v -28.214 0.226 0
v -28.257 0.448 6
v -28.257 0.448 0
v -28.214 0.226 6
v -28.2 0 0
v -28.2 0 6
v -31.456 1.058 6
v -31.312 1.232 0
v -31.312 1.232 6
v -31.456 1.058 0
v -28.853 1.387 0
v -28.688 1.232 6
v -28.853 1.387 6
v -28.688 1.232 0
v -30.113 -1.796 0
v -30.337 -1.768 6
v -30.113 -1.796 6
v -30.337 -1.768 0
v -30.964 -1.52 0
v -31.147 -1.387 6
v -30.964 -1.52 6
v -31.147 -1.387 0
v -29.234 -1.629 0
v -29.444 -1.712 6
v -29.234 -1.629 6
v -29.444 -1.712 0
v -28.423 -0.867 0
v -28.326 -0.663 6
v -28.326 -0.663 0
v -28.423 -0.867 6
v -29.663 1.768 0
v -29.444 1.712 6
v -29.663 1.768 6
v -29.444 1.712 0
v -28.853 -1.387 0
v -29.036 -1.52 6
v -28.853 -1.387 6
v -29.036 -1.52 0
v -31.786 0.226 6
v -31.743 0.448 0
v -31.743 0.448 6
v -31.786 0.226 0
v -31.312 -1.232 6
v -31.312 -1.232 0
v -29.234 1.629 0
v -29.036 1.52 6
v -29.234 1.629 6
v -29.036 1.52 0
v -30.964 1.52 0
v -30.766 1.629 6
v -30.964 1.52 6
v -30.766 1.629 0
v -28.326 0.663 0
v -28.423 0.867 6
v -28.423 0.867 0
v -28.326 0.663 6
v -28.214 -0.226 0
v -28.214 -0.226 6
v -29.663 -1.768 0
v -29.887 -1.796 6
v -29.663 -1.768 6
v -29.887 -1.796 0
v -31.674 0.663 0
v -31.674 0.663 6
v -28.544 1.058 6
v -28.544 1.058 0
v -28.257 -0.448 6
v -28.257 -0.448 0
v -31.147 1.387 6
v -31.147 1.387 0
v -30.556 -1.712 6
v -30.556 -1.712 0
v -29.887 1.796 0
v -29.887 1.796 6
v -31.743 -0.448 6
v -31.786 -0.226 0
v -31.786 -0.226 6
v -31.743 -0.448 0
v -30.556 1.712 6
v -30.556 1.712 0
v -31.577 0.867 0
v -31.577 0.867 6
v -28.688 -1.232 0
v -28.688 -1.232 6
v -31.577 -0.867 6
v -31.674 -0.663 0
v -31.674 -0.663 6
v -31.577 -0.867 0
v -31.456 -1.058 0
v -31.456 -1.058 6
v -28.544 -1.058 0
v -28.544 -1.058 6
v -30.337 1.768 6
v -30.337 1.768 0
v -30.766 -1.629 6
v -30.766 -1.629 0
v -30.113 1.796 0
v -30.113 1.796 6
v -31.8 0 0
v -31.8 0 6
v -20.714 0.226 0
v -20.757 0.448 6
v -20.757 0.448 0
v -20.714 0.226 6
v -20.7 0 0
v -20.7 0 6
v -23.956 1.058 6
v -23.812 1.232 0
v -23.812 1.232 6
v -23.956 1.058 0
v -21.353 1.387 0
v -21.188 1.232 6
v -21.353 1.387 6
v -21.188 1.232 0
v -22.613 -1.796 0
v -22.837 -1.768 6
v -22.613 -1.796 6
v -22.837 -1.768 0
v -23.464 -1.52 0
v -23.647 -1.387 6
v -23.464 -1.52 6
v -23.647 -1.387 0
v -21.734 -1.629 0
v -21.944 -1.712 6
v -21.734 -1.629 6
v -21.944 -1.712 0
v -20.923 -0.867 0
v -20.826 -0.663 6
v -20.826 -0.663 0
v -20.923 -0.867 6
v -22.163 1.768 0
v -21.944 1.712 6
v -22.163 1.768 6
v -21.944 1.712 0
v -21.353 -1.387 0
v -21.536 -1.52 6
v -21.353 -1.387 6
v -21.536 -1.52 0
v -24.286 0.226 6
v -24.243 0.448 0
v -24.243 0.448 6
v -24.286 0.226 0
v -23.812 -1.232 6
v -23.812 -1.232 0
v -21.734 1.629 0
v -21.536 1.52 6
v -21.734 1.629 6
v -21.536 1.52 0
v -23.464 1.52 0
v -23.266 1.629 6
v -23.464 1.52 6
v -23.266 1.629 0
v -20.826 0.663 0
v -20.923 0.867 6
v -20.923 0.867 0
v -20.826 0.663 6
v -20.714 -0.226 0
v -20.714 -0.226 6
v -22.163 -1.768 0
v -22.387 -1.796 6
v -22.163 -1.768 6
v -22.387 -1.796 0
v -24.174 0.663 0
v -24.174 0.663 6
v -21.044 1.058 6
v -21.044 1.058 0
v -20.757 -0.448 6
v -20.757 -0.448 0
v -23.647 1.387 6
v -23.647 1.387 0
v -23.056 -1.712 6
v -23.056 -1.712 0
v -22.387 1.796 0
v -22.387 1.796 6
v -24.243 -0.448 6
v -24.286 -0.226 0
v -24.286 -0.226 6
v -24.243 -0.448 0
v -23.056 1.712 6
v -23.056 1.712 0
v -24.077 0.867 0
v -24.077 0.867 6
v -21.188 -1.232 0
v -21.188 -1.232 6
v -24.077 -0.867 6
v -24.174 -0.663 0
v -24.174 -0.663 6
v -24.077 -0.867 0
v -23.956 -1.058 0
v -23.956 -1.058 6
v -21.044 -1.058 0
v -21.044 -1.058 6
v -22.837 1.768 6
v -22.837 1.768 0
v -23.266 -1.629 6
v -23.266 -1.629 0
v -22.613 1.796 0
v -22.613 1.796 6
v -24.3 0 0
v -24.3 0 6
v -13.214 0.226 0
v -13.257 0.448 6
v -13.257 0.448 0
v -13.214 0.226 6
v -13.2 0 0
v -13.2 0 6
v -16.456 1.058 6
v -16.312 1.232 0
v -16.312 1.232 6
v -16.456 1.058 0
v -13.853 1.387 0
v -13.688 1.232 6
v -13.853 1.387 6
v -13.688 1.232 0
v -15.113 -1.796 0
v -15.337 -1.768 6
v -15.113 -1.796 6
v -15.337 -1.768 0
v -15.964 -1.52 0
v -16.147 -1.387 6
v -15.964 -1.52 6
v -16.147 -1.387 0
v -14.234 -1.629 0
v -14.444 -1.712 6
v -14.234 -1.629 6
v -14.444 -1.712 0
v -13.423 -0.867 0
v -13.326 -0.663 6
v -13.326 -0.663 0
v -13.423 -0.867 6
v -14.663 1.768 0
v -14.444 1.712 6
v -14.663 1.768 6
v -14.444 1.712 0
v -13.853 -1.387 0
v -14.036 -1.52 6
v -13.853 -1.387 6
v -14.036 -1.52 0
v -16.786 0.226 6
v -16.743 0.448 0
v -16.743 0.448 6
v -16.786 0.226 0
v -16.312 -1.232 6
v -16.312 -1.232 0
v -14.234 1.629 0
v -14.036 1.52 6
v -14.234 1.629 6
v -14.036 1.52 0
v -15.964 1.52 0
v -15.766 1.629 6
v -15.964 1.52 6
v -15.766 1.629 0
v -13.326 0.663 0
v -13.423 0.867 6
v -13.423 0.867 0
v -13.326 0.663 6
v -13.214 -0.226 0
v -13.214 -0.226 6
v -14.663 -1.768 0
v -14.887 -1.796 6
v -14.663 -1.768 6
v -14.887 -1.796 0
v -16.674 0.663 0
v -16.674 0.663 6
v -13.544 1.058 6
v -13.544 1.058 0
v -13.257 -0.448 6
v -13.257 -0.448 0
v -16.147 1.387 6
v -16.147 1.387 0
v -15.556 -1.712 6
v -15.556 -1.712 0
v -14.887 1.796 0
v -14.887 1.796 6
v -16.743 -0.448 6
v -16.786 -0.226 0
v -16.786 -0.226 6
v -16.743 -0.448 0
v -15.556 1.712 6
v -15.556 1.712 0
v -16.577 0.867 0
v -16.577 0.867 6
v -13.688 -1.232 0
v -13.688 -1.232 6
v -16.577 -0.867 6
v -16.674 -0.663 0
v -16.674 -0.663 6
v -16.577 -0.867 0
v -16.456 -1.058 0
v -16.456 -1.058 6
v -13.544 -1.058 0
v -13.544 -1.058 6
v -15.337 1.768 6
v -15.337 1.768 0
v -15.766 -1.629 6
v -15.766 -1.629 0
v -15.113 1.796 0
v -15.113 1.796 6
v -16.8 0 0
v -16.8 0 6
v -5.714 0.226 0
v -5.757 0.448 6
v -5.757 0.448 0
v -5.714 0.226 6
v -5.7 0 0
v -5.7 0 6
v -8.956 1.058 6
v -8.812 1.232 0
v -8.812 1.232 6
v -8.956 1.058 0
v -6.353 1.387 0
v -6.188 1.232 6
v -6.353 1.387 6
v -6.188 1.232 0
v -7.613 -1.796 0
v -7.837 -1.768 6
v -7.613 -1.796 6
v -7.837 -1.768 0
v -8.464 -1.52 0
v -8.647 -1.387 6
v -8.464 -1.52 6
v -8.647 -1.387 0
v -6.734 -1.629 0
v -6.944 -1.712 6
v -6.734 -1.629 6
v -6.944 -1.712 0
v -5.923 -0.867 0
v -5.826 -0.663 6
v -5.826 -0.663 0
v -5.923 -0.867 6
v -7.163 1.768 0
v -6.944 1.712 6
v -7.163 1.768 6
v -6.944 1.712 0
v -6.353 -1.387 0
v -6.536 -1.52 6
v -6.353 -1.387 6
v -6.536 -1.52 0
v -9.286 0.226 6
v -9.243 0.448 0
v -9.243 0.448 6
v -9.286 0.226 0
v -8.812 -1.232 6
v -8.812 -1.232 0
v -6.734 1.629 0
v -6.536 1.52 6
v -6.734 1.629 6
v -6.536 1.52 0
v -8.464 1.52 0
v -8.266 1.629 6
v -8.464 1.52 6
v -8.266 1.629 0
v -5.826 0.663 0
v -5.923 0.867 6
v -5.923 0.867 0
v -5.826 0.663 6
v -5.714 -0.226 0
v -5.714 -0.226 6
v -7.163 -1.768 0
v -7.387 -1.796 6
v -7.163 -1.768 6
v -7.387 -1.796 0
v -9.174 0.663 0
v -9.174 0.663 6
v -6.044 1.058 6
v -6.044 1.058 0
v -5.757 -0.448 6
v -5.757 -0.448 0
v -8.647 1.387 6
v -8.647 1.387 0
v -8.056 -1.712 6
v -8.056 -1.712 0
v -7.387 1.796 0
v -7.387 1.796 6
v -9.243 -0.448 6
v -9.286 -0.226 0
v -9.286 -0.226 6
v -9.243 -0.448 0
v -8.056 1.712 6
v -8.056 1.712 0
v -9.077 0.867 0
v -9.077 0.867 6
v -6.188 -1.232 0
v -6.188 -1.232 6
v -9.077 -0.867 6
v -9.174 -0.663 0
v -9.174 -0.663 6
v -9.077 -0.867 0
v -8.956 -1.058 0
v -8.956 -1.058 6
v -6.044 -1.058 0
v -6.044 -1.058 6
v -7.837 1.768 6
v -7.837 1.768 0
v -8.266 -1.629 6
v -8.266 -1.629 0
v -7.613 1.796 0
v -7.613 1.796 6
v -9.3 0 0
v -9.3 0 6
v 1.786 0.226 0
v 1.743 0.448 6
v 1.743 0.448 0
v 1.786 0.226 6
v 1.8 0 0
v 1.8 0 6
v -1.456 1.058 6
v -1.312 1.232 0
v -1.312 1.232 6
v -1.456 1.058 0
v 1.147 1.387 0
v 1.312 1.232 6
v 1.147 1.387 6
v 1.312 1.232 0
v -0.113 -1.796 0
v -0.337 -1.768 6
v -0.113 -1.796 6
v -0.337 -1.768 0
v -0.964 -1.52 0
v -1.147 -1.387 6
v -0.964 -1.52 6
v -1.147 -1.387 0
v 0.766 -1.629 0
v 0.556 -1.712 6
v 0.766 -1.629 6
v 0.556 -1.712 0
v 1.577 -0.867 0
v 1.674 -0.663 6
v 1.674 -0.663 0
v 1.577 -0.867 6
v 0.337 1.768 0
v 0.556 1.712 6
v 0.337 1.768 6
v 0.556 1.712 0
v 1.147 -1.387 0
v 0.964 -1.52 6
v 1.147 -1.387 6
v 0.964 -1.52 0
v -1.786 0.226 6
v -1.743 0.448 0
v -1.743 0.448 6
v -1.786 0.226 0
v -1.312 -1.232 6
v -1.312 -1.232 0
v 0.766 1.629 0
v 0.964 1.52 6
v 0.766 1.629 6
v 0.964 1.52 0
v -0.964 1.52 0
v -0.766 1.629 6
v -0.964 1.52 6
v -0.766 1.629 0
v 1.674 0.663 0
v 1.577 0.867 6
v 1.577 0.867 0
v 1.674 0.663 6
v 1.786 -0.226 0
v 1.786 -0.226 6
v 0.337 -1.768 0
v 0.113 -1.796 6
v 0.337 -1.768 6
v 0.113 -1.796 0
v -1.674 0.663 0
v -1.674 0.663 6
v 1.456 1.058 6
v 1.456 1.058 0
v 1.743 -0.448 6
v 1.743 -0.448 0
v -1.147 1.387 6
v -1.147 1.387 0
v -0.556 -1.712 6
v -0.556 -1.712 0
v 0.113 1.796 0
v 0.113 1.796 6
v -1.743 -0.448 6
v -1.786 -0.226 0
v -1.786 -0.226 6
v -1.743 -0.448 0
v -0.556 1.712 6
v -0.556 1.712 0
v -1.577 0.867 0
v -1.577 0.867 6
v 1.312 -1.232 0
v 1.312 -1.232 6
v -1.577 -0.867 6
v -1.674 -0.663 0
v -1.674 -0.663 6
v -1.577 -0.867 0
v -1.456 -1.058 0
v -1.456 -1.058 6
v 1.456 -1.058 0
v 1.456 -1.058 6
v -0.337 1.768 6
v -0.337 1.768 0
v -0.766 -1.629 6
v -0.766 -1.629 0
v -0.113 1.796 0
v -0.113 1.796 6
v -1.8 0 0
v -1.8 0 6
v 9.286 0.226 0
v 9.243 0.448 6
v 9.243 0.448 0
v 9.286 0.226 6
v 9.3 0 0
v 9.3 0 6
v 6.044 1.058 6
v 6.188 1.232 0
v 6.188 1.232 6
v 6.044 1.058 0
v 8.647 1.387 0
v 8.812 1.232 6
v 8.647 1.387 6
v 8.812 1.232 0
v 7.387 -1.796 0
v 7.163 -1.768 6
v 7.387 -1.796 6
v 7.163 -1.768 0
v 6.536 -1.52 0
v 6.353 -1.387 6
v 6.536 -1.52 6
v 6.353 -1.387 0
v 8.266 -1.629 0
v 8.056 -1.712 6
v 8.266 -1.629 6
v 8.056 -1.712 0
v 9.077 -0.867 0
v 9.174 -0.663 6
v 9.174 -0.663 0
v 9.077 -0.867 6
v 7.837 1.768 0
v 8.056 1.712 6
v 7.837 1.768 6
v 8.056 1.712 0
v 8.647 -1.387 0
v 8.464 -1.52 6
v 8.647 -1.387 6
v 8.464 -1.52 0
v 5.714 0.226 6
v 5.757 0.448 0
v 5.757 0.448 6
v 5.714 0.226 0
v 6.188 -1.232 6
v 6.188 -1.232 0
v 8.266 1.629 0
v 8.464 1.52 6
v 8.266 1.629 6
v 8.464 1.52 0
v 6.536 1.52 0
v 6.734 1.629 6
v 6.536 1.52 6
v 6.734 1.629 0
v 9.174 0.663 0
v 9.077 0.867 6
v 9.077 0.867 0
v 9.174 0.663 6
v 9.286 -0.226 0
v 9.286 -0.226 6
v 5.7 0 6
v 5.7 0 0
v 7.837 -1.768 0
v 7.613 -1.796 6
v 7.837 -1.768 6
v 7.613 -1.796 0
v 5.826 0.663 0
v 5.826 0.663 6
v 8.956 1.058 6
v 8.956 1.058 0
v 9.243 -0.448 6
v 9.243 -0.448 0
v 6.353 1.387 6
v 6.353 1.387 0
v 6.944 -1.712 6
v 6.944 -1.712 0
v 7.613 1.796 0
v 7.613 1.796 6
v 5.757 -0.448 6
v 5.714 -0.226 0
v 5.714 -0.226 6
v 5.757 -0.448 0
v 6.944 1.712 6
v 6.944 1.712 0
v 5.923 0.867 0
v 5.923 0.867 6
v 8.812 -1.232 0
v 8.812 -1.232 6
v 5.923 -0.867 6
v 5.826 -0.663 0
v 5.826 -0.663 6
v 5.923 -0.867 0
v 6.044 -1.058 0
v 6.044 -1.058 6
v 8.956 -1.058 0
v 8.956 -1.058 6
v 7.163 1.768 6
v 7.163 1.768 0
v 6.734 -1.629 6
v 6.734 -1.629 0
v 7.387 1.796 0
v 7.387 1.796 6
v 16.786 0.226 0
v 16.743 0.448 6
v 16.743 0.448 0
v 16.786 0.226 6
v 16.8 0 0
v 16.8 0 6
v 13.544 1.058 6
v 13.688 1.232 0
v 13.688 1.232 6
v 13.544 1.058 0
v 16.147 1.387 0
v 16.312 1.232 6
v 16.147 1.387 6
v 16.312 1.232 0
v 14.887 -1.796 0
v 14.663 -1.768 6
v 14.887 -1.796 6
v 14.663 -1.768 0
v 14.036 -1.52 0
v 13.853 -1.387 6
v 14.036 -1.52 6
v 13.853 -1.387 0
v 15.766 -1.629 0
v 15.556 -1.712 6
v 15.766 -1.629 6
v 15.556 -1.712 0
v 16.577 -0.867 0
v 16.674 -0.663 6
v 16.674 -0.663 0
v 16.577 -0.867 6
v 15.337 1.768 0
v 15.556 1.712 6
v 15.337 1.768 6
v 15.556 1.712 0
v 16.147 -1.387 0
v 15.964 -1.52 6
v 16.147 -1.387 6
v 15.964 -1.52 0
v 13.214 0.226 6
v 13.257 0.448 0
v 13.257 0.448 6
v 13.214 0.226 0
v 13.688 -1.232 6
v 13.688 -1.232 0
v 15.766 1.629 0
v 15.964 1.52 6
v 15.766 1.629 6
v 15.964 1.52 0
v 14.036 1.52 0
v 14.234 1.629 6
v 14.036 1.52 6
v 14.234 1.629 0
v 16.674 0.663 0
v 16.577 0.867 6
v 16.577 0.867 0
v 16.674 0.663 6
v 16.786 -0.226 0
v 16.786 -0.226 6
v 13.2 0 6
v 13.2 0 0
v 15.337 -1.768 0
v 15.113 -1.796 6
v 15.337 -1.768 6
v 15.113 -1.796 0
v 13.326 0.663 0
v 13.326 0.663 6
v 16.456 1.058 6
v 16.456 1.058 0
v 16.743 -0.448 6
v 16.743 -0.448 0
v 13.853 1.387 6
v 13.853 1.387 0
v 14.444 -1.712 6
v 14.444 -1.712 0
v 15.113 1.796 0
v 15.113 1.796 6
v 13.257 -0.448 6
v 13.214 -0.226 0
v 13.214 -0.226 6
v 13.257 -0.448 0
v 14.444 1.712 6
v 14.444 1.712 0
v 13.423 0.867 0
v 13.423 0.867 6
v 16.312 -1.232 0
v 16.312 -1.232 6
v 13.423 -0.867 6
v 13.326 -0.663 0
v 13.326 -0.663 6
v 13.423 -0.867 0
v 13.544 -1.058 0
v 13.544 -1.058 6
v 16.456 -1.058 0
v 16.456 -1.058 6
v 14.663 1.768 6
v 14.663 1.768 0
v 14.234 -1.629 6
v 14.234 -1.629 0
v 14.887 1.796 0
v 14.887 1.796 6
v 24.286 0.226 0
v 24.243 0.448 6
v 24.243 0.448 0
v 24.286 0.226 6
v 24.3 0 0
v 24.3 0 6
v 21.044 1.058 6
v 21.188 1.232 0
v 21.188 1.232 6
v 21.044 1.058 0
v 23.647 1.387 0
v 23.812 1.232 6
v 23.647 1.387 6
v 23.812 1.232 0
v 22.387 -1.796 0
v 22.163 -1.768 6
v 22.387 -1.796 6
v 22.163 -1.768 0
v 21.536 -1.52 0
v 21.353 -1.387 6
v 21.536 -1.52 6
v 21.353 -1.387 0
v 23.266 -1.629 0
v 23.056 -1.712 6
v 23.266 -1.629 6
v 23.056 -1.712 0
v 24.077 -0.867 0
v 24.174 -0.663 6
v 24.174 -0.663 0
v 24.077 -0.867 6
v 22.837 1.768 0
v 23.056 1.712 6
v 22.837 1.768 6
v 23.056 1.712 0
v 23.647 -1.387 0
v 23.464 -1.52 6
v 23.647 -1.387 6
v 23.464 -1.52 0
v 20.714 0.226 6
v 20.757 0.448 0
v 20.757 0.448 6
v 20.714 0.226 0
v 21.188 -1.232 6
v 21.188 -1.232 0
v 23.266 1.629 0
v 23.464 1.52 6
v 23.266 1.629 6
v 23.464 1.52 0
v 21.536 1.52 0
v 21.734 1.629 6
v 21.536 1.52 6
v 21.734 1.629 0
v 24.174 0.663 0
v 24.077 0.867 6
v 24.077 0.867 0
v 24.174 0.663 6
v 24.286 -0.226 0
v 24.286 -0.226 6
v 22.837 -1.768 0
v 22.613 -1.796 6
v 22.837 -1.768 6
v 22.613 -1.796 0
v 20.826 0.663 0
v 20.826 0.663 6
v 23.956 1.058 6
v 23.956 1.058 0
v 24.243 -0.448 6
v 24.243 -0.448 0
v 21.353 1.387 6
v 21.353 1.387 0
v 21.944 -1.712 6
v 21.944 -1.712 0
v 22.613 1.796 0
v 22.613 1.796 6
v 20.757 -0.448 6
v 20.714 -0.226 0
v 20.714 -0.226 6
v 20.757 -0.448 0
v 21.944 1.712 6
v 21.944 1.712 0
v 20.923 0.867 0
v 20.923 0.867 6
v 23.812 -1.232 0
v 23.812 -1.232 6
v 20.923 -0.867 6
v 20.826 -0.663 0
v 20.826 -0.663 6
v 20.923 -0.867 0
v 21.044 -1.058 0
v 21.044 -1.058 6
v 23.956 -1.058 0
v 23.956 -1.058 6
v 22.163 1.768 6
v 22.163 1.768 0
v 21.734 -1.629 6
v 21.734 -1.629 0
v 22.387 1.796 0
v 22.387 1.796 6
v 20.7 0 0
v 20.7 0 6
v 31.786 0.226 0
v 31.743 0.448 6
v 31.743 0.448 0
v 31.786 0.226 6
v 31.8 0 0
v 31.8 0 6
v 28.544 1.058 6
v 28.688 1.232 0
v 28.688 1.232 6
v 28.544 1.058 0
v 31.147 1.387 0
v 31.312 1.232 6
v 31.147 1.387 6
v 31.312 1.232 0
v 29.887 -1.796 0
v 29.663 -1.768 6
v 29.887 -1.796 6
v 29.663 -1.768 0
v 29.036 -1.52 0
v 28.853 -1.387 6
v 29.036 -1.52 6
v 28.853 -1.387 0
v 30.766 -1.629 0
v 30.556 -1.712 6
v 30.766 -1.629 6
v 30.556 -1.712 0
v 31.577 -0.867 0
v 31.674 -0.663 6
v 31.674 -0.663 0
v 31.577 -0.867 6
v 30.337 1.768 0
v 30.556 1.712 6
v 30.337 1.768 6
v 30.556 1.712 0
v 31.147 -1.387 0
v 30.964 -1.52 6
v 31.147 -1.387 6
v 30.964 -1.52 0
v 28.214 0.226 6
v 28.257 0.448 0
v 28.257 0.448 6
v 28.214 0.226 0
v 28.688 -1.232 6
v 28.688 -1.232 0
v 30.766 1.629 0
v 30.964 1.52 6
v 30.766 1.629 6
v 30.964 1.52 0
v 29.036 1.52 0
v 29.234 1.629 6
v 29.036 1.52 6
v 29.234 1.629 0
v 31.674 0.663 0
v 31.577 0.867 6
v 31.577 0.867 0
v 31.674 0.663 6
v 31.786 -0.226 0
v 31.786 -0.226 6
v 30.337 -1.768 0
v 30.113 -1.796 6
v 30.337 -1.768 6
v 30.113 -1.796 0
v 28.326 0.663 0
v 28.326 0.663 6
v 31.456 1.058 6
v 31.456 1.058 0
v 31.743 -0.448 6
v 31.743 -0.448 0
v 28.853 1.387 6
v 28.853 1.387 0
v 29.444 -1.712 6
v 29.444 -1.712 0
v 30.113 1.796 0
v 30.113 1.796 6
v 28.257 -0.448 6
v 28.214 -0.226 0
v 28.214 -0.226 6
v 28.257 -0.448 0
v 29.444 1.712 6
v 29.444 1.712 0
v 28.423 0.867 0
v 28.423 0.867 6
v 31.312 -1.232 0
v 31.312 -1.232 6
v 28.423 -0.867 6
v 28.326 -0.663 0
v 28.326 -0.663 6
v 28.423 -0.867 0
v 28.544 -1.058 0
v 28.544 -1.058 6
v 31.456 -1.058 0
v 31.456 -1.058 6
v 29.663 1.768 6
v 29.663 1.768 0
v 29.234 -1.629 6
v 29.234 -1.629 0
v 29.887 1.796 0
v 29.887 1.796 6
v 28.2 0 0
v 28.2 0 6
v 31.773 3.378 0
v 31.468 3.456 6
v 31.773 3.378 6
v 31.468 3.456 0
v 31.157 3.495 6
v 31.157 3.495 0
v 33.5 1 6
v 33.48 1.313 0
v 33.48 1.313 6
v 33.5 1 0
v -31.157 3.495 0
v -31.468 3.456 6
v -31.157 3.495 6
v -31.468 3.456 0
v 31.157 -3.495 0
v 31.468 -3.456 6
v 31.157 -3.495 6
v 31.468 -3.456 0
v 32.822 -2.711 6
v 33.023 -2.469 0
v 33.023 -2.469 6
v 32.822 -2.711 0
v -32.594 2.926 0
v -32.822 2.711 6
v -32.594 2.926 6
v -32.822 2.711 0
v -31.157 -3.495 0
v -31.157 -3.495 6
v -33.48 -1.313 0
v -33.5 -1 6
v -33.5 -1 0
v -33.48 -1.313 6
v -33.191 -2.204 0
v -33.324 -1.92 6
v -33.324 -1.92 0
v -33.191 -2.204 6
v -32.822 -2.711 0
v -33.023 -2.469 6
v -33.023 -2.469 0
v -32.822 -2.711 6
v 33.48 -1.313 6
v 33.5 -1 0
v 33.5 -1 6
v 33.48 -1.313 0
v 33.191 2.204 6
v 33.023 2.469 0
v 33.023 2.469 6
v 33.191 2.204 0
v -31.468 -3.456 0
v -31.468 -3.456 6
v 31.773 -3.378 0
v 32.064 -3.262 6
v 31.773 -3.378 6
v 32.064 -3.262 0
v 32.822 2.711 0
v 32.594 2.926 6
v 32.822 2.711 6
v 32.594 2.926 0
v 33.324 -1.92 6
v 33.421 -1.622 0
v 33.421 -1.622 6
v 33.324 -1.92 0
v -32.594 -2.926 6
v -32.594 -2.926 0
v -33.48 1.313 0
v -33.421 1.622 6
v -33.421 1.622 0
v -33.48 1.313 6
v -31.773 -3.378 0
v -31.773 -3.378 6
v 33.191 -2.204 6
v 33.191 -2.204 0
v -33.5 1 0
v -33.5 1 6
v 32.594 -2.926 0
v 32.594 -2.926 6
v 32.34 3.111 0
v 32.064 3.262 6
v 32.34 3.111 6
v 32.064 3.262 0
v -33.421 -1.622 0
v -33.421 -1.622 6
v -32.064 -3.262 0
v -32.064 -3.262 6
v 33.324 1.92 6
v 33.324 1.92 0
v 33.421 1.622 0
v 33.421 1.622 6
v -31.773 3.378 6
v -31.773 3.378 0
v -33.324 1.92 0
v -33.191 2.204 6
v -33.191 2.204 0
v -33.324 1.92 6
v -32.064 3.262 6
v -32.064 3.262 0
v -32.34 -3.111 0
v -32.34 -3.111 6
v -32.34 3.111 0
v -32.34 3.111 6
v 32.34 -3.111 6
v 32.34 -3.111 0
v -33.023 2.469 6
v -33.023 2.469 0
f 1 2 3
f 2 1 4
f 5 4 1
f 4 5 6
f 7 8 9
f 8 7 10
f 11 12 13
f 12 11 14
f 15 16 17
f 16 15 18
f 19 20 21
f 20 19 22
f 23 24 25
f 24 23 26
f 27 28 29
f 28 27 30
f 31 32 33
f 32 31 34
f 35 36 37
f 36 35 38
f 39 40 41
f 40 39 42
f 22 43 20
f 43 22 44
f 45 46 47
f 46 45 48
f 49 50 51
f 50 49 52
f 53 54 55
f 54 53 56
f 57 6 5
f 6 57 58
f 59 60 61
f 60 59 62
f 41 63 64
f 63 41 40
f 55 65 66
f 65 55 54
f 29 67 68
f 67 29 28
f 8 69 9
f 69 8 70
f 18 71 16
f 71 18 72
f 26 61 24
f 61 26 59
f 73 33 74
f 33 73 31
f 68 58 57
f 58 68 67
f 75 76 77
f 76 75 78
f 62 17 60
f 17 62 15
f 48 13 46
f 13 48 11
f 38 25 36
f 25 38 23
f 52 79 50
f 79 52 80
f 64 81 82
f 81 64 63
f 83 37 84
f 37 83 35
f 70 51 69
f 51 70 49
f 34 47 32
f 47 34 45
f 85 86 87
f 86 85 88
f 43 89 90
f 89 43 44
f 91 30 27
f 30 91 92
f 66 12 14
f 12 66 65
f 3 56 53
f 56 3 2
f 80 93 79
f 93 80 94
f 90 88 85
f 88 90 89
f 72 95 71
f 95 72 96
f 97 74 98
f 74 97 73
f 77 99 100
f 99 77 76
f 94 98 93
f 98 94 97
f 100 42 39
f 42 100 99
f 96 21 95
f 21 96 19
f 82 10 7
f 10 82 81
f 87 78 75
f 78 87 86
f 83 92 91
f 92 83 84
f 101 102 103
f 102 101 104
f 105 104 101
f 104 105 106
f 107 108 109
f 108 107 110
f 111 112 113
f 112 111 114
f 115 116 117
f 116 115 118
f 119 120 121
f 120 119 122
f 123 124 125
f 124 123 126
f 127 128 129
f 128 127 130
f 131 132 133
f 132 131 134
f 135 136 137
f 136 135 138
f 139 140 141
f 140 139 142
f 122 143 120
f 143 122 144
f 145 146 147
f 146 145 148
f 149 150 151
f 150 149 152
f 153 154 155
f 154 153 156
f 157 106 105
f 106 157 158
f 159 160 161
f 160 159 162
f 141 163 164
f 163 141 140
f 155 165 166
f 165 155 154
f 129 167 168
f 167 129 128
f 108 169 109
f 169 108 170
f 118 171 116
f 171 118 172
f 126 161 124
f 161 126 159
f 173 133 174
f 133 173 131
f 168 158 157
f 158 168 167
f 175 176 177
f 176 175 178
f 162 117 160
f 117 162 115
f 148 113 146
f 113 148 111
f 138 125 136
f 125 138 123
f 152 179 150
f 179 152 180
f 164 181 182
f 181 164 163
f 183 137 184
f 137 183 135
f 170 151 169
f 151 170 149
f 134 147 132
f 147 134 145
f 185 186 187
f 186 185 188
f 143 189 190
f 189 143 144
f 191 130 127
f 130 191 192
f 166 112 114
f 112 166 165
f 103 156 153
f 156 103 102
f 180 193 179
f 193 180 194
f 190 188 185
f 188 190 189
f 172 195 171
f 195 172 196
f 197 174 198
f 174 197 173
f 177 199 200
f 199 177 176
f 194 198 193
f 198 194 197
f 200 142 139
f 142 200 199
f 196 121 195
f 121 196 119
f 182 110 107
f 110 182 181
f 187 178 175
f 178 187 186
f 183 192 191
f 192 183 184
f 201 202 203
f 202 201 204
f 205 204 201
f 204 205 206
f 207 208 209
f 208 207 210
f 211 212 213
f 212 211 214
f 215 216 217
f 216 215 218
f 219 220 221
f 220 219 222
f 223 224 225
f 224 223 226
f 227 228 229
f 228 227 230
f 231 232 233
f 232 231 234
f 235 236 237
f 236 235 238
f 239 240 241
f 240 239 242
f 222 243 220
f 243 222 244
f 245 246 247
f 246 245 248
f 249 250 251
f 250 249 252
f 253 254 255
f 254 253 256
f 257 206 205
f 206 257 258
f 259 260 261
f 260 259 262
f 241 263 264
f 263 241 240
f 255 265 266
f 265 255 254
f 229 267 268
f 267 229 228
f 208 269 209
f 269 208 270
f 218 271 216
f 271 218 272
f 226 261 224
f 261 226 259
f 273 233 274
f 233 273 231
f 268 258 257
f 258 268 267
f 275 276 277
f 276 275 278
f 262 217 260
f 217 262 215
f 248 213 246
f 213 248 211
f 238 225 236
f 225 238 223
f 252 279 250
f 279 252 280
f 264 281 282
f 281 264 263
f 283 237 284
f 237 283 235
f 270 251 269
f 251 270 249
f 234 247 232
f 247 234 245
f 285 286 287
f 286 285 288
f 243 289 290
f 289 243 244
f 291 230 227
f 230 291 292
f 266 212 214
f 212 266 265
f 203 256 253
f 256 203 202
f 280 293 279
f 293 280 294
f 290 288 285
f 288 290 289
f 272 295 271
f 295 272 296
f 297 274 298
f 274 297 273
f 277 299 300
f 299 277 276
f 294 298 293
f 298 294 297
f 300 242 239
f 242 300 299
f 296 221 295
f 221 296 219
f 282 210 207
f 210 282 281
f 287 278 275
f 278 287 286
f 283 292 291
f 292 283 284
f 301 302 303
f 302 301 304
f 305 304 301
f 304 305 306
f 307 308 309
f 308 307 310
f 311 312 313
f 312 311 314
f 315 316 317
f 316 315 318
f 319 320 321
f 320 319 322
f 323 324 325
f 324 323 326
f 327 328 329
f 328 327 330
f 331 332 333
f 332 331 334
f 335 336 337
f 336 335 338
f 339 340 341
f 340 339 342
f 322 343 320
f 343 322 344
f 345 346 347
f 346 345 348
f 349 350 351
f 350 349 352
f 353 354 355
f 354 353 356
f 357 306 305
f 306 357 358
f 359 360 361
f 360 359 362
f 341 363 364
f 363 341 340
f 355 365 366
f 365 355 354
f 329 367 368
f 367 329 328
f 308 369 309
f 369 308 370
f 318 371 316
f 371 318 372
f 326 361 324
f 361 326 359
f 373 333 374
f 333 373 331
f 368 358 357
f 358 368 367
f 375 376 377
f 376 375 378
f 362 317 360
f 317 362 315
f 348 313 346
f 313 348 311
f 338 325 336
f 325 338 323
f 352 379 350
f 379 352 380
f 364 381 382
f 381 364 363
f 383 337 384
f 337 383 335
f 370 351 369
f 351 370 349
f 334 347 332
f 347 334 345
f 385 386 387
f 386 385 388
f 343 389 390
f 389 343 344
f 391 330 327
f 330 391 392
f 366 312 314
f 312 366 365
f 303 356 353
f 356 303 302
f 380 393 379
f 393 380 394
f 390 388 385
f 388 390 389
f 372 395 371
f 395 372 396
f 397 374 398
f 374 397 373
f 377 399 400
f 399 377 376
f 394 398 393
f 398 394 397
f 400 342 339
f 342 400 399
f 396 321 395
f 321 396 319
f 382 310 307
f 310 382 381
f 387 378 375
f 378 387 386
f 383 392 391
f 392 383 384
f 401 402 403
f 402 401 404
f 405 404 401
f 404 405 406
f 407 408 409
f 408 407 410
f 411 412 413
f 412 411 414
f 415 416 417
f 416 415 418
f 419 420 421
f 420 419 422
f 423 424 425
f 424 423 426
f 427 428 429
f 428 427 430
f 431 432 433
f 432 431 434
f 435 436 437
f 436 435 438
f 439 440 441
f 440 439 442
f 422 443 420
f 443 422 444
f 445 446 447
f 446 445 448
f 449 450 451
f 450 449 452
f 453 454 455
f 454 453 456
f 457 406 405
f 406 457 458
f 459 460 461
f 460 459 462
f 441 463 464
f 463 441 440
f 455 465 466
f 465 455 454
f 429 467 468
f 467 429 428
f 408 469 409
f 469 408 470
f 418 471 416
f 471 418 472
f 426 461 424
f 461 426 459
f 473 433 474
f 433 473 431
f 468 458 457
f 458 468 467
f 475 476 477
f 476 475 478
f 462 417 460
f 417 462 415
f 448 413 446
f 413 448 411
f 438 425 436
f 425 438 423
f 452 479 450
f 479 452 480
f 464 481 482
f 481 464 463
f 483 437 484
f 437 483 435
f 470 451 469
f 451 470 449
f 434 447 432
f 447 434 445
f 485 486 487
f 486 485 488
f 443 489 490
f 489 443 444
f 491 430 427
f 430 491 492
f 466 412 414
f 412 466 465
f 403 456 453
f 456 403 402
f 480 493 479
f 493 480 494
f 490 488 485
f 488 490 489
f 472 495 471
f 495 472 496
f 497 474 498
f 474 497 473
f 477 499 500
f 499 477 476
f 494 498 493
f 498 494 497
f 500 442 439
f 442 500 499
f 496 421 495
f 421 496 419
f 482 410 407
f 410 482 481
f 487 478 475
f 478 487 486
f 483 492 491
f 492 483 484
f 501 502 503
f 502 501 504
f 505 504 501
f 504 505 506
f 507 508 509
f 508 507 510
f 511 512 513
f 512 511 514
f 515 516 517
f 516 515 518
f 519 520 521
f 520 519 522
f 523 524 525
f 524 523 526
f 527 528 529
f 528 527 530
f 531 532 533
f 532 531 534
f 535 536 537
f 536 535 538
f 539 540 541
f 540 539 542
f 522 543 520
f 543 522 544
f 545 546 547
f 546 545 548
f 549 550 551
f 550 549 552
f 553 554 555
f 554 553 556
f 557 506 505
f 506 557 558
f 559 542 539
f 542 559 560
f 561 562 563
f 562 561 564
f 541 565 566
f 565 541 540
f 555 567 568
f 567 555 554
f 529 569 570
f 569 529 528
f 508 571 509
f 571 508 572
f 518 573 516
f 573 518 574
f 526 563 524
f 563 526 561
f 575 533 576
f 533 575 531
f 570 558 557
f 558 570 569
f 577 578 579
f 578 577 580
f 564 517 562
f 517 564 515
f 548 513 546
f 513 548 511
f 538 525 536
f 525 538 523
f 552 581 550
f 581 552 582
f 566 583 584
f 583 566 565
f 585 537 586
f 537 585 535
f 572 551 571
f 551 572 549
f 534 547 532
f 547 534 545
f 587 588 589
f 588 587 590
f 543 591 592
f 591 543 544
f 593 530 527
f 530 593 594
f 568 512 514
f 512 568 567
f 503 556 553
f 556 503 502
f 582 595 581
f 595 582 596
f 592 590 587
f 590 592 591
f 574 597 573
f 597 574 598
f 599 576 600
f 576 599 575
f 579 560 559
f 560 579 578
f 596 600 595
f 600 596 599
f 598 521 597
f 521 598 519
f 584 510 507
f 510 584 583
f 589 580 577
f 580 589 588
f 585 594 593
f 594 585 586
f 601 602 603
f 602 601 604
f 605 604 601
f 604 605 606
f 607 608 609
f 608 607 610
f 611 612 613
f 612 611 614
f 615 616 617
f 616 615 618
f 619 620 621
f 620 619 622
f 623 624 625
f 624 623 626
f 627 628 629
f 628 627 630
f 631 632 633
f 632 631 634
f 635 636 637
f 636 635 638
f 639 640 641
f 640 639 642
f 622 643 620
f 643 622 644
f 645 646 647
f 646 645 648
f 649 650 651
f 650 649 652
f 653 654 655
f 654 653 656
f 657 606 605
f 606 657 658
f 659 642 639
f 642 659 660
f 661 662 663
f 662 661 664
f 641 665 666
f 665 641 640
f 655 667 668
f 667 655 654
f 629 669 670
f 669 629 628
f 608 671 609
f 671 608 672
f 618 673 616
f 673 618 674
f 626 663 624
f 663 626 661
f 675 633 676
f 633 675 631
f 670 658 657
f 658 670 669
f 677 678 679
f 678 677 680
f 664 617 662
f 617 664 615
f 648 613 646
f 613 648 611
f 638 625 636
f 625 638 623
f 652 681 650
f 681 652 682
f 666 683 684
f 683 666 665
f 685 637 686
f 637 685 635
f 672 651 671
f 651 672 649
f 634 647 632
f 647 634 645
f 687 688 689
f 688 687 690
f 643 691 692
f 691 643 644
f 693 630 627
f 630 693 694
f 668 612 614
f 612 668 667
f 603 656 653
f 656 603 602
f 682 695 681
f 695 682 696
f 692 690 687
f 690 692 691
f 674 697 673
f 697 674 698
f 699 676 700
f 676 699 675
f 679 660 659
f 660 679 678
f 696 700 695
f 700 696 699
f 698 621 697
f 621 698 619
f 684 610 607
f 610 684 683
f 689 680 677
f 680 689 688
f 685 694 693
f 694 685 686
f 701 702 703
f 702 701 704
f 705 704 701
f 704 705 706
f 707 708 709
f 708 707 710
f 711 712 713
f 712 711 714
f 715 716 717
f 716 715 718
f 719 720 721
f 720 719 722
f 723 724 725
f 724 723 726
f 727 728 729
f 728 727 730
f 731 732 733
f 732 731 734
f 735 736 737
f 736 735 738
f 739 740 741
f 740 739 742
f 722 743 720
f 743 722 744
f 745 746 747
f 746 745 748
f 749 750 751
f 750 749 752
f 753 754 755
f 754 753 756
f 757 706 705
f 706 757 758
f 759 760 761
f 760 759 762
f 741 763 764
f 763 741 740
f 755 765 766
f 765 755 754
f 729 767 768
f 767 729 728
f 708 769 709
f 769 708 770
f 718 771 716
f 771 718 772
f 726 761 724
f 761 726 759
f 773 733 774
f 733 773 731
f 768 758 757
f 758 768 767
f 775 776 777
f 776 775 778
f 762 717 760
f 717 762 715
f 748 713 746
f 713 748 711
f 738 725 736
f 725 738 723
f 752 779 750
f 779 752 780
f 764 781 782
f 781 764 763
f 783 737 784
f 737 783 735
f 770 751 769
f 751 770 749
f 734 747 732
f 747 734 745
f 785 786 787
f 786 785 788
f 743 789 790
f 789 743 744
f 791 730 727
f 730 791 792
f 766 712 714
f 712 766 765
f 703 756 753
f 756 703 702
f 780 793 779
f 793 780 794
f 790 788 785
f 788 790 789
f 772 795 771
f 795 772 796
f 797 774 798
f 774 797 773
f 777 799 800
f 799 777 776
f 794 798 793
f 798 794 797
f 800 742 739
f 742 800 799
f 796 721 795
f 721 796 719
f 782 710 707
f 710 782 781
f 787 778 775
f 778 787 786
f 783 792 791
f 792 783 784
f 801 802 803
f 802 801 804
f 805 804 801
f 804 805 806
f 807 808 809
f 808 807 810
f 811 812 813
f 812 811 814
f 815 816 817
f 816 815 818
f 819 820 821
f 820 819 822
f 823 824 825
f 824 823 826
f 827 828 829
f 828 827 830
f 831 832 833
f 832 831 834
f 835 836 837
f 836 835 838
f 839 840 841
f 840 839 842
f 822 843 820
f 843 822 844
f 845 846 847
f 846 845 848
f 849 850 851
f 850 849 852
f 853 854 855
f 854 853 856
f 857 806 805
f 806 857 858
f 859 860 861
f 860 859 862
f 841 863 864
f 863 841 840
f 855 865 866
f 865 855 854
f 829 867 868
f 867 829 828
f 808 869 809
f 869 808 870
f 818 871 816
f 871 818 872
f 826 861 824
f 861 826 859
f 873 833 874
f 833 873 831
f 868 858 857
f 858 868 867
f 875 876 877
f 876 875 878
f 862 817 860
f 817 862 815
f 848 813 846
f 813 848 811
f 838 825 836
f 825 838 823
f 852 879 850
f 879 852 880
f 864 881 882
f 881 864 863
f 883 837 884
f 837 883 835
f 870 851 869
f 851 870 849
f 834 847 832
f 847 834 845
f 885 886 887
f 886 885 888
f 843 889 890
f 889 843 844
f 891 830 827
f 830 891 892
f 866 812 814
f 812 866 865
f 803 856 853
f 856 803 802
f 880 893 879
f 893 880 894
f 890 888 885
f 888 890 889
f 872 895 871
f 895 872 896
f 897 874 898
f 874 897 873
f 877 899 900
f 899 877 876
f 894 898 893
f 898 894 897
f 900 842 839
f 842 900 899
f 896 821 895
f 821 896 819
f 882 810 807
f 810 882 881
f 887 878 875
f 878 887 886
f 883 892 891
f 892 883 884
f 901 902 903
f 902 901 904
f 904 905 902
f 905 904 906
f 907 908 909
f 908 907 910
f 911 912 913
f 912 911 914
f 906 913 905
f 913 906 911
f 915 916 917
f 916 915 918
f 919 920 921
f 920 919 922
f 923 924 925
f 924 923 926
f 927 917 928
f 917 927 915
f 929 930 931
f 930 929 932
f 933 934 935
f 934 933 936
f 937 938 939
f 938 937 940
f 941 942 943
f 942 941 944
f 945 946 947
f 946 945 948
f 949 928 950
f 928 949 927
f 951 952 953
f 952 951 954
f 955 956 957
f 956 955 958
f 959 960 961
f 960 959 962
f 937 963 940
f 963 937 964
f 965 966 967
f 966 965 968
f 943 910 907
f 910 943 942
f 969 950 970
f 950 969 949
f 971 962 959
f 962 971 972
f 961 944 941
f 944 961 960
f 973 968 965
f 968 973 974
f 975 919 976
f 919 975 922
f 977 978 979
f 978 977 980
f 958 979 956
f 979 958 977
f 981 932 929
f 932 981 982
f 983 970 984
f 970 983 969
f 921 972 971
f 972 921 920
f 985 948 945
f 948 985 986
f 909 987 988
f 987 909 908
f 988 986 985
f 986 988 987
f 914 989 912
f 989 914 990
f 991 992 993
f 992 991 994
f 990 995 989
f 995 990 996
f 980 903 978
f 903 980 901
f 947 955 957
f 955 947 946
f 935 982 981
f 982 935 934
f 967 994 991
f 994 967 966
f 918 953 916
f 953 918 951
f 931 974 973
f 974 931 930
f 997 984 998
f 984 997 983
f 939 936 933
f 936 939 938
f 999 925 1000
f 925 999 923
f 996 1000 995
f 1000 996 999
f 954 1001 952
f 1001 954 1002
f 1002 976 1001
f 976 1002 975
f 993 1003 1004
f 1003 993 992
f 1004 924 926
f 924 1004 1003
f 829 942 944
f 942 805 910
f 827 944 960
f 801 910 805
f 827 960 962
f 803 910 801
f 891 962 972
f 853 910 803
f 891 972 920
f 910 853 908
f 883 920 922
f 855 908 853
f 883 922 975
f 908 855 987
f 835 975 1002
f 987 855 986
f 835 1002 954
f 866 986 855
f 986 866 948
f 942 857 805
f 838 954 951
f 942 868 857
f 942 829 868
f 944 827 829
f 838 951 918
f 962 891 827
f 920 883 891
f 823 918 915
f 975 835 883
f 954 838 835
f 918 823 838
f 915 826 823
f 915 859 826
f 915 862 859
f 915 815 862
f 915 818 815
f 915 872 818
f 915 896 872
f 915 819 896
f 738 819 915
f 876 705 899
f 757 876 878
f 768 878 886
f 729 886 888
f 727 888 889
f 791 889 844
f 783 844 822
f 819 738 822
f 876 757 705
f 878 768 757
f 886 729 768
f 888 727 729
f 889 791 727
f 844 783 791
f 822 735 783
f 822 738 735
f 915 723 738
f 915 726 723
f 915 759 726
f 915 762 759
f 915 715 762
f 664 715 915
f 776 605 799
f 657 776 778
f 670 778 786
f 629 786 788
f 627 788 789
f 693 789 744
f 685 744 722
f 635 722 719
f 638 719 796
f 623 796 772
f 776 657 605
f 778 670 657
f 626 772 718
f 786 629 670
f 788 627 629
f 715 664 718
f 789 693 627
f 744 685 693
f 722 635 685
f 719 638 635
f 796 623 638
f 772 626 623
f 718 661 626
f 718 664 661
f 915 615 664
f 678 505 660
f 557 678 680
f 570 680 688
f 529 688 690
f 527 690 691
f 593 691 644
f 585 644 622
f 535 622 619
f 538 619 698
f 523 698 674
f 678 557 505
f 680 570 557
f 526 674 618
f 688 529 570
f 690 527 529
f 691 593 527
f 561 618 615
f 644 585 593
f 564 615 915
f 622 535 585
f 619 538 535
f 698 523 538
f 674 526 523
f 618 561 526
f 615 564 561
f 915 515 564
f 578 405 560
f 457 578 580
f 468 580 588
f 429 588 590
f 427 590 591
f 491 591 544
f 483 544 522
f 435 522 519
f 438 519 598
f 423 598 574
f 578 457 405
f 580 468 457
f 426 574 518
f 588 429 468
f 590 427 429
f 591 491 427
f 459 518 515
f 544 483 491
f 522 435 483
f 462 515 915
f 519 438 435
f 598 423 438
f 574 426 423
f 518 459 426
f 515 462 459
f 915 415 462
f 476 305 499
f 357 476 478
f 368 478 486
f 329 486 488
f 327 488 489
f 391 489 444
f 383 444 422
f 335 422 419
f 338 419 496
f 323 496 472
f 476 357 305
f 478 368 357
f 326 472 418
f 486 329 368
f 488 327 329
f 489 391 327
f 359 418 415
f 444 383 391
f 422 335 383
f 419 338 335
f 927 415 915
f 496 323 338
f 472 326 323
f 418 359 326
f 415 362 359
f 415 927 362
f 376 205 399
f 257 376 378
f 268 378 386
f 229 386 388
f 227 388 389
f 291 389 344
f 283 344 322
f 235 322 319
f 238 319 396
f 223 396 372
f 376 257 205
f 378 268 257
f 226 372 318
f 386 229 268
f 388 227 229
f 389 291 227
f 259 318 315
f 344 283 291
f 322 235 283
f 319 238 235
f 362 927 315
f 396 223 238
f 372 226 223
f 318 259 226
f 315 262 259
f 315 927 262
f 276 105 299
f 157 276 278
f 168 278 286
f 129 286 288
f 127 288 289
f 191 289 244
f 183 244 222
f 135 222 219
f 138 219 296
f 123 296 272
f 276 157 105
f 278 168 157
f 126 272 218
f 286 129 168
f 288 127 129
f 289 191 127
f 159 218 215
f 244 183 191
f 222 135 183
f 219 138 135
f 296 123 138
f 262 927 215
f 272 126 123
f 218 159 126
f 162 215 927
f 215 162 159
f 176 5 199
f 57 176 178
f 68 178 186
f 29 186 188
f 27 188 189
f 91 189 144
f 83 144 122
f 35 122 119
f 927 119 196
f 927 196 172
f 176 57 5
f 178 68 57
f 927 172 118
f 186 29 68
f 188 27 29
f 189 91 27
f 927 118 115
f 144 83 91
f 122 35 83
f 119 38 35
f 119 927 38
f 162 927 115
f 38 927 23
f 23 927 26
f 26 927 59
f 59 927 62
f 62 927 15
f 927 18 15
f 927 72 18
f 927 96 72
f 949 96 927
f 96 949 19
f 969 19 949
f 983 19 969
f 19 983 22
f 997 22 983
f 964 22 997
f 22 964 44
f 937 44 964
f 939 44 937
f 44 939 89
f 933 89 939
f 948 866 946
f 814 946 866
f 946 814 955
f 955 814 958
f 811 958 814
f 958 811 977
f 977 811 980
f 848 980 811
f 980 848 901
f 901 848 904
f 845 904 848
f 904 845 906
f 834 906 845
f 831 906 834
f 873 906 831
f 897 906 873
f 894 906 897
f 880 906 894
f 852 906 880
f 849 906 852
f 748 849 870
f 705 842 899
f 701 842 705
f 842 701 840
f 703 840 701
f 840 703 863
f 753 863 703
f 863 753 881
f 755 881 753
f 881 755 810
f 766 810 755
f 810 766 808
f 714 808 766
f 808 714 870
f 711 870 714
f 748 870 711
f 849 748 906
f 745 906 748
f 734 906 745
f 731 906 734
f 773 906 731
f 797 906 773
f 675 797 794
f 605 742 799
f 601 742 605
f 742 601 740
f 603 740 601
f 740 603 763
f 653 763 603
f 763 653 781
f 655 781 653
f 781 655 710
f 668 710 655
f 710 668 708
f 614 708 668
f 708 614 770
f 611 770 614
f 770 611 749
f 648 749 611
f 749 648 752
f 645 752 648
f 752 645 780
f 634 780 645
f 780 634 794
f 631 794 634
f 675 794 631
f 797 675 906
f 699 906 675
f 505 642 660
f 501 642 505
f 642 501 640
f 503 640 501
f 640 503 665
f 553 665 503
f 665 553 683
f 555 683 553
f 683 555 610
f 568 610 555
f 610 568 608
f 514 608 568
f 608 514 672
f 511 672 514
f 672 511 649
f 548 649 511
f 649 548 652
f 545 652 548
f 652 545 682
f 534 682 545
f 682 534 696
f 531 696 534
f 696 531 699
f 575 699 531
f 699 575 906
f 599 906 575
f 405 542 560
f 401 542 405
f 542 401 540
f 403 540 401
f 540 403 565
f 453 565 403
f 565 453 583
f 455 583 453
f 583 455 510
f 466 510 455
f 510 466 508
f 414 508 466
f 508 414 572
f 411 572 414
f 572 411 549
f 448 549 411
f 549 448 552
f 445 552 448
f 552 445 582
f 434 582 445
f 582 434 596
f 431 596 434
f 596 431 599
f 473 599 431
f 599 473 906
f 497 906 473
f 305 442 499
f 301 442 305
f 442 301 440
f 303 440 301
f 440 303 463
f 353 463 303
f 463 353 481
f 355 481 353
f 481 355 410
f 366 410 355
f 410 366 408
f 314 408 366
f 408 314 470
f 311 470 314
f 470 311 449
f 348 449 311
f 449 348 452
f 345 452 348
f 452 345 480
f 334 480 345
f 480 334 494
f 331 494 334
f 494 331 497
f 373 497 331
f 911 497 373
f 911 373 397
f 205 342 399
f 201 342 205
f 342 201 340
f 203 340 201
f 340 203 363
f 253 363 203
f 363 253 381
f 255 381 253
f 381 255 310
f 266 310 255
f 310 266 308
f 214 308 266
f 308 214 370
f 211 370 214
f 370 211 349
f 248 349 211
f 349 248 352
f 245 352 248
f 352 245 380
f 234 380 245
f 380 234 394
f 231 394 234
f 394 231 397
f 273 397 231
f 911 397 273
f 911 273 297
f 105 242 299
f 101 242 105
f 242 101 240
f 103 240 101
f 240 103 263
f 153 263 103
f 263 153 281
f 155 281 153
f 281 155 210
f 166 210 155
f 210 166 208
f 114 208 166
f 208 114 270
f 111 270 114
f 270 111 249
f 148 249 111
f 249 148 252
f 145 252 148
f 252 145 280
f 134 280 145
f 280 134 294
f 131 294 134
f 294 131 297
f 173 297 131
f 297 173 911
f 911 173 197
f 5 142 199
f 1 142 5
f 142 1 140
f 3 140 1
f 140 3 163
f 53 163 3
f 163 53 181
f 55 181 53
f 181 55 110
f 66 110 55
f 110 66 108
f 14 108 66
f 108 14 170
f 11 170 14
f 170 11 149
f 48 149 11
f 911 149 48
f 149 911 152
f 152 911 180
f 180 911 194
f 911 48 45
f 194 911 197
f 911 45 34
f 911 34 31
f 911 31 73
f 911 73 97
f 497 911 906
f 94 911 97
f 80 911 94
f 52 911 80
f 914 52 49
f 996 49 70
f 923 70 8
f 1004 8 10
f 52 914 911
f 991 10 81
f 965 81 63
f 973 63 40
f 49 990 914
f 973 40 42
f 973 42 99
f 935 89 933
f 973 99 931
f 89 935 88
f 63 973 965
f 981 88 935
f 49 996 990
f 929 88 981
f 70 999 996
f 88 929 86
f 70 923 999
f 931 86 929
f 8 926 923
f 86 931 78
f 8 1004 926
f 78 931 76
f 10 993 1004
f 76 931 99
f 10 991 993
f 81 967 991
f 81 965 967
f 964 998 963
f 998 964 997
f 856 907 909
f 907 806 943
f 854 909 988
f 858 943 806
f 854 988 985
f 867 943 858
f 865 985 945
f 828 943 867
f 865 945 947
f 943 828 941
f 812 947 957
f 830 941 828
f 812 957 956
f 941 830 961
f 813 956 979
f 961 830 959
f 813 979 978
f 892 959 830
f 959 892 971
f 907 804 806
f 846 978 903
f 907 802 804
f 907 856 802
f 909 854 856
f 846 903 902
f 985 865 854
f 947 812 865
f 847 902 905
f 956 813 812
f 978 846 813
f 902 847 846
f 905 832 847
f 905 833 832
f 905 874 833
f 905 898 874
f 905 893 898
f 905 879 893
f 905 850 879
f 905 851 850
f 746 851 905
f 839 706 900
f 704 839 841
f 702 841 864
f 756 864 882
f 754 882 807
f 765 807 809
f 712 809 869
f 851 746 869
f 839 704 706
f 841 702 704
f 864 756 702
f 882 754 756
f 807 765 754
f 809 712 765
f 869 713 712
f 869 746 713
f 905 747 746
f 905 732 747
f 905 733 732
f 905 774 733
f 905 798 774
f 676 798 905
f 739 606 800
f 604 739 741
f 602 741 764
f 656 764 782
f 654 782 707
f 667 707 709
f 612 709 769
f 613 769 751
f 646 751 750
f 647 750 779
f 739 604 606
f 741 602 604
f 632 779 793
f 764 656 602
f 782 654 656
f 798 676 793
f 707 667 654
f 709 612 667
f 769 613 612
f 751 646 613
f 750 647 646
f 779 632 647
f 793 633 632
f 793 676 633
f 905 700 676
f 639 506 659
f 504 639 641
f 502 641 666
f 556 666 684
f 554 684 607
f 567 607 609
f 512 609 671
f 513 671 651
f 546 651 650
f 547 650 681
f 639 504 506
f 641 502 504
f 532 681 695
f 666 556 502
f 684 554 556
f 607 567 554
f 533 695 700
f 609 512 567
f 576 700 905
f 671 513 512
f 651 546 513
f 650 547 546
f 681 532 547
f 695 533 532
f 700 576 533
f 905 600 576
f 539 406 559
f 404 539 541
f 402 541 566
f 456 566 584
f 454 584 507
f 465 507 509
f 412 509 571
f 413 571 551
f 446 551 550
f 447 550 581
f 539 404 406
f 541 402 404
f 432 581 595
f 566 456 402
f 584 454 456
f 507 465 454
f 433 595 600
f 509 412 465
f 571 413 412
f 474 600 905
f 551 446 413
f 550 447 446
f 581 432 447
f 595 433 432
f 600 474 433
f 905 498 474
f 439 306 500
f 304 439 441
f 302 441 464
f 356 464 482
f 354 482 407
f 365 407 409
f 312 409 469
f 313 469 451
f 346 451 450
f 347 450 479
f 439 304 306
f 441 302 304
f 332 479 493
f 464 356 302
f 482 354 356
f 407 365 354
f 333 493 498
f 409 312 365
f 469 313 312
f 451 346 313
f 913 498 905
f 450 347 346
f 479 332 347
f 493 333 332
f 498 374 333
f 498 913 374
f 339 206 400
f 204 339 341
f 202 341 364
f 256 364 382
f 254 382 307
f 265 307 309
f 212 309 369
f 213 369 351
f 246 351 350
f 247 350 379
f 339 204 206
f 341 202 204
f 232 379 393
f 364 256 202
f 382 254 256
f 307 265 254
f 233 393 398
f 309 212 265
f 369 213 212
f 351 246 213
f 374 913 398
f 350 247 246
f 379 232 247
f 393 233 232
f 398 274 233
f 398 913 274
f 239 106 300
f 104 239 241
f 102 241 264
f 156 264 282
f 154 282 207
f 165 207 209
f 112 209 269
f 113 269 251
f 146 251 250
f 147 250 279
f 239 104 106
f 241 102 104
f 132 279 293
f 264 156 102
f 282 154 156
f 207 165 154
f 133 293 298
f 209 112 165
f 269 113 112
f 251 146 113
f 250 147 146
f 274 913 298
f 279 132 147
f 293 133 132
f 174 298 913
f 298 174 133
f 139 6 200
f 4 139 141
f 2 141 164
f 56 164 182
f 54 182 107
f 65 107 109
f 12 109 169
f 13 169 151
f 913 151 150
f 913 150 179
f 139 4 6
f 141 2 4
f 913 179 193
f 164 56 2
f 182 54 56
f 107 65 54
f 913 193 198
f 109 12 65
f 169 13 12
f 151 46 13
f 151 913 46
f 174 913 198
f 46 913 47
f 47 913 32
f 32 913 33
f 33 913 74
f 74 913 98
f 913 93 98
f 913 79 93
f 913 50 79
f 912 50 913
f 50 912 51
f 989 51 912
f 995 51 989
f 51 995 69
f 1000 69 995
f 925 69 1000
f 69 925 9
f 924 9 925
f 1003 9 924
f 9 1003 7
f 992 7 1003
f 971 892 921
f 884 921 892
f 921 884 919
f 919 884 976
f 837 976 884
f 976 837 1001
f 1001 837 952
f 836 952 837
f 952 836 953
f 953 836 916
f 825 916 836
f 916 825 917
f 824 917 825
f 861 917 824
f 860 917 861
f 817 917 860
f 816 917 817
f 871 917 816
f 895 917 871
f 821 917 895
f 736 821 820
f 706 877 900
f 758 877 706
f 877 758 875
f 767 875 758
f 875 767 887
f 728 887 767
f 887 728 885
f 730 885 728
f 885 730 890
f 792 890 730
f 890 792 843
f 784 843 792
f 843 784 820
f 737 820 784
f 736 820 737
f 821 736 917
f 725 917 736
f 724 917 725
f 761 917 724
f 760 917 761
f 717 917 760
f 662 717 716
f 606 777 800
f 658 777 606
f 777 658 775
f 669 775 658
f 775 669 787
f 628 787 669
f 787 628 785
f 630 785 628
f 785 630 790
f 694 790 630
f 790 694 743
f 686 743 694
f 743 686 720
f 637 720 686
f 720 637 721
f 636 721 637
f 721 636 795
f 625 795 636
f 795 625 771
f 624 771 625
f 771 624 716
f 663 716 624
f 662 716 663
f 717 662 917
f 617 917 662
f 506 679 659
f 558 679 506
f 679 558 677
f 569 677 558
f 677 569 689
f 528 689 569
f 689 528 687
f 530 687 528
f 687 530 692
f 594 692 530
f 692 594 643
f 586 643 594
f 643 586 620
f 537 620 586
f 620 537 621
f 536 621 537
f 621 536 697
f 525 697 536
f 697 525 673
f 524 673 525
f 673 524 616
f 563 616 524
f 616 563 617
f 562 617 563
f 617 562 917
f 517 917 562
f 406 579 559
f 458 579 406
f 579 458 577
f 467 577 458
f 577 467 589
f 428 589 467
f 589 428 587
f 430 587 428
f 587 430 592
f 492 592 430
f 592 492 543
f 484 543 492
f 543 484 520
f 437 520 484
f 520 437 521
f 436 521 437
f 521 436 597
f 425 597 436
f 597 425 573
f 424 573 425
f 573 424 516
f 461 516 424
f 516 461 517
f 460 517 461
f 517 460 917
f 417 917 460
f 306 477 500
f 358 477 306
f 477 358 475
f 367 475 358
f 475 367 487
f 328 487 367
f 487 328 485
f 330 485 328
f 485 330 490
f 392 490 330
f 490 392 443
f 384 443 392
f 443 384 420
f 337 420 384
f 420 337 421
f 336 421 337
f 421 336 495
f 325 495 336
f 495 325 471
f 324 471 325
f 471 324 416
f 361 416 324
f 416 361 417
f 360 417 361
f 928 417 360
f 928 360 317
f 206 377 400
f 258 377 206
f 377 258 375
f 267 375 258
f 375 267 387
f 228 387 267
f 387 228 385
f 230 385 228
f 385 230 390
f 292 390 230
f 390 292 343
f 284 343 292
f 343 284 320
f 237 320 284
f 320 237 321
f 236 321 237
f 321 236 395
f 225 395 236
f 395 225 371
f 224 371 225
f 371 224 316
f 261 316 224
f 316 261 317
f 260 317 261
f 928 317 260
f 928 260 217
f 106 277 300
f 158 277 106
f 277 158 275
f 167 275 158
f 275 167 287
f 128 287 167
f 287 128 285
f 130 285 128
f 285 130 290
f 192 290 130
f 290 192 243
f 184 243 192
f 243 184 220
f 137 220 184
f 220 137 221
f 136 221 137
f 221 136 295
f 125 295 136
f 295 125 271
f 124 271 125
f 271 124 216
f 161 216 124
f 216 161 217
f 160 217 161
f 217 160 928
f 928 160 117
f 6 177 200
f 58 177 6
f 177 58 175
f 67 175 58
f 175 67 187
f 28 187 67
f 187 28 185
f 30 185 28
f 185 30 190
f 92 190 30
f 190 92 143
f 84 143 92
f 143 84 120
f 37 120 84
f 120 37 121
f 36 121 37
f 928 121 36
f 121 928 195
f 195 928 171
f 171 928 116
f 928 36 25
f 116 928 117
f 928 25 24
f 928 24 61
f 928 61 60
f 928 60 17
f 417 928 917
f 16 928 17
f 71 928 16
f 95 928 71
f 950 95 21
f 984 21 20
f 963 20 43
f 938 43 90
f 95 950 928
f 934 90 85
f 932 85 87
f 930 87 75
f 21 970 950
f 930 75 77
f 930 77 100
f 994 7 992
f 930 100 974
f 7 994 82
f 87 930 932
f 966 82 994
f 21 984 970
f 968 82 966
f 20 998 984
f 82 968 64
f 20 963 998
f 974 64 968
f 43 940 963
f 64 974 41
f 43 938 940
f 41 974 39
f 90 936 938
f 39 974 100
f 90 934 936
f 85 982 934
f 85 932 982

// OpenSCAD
$fn = 50;


difference() {
	union() {
		translate(v = [0, 0, 0]) {
			rotate(a = [0, 0, 0]) {
				hull() {
					translate(v = [-31.0000000000, 1.0000000000, 0]) {
						rotate(a = [0, 0, 0]) {
							translate(v = [0, 0, 0]) {
								rotate(a = [0, 0, 0]) {
									cylinder(h = 6, r = 2.5000000000);
								}
							}
						}
					}
					translate(v = [31.0000000000, 1.0000000000, 0]) {
						rotate(a = [0, 0, 0]) {
							translate(v = [0, 0, 0]) {
								rotate(a = [0, 0, 0]) {
									cylinder(h = 6, r = 2.5000000000);
								}
							}
						}
					}
					translate(v = [-31.0000000000, -1.0000000000, 0]) {
						rotate(a = [0, 0, 0]) {
							translate(v = [0, 0, 0]) {
								rotate(a = [0, 0, 0]) {
									cylinder(h = 6, r = 2.5000000000);
								}
							}
						}
					}
					translate(v = [31.0000000000, -1.0000000000, 0]) {
						rotate(a = [0, 0, 0]) {
							translate(v = [0, 0, 0]) {
								rotate(a = [0, 0, 0]) {
									cylinder(h = 6, r = 2.5000000000);
								}
							}
						}
					}
				}
			}
		}
	}
	union() {
		translate(v = [-30.0000000000, 0.0000000000, 0]) {
			rotate(a = [0, 0, 0]) {
				translate(v = [0, 0, -50]) {
					rotate(a = [0, 0, 0]) {
						cylinder(h = 100, r = 1.8000000000);
					}
				}
			}
		}
		translate(v = [-22.5000000000, 0.0000000000, 0]) {
			rotate(a = [0, 0, 0]) {
				translate(v = [0, 0, -50]) {
					rotate(a = [0, 0, 0]) {
						cylinder(h = 100, r = 1.8000000000);
					}
				}
			}
		}
		translate(v = [-15.0000000000, 0.0000000000, 0]) {
			rotate(a = [0, 0, 0]) {
				translate(v = [0, 0, -50]) {
					rotate(a = [0, 0, 0]) {
						cylinder(h = 100, r = 1.8000000000);
					}
				}
			}
		}
		translate(v = [-7.5000000000, 0.0000000000, 0]) {
			rotate(a = [0, 0, 0]) {
				translate(v = [0, 0, -50]) {
					rotate(a = [0, 0, 0]) {
						cylinder(h = 100, r = 1.8000000000);
					}
				}
			}
		}
		translate(v = [0.0000000000, 0.0000000000, 0]) {
			rotate(a = [0, 0, 0]) {
				translate(v = [0, 0, -50]) {
					rotate(a = [0, 0, 0]) {
						cylinder(h = 100, r = 1.8000000000);
					}
				}
			}
		}
		translate(v = [7.5000000000, 0.0000000000, 0]) {
			rotate(a = [0, 0, 0]) {
				translate(v = [0, 0, -50]) {
					rotate(a = [0, 0, 0]) {
						cylinder(h = 100, r = 1.8000000000);
					}
				}
			}
		}
		translate(v = [15.0000000000, 0.0000000000, 0]) {
			rotate(a = [0, 0, 0]) {
				translate(v = [0, 0, -50]) {
					rotate(a = [0, 0, 0]) {
						cylinder(h = 100, r = 1.8000000000);
					}
				}
			}
		}
		translate(v = [22.5000000000, 0.0000000000, 0]) {
			rotate(a = [0, 0, 0]) {
				translate(v = [0, 0, -50]) {
					rotate(a = [0, 0, 0]) {
						cylinder(h = 100, r = 1.8000000000);
					}
				}
			}
		}
		translate(v = [30.0000000000, 0.0000000000, 0]) {
			rotate(a = [0, 0, 0]) {
				translate(v = [0, 0, -50]) {
					rotate(a = [0, 0, 0]) {
						cylinder(h = 100, r = 1.8000000000);
					}
				}
			}
		}
	}
}
